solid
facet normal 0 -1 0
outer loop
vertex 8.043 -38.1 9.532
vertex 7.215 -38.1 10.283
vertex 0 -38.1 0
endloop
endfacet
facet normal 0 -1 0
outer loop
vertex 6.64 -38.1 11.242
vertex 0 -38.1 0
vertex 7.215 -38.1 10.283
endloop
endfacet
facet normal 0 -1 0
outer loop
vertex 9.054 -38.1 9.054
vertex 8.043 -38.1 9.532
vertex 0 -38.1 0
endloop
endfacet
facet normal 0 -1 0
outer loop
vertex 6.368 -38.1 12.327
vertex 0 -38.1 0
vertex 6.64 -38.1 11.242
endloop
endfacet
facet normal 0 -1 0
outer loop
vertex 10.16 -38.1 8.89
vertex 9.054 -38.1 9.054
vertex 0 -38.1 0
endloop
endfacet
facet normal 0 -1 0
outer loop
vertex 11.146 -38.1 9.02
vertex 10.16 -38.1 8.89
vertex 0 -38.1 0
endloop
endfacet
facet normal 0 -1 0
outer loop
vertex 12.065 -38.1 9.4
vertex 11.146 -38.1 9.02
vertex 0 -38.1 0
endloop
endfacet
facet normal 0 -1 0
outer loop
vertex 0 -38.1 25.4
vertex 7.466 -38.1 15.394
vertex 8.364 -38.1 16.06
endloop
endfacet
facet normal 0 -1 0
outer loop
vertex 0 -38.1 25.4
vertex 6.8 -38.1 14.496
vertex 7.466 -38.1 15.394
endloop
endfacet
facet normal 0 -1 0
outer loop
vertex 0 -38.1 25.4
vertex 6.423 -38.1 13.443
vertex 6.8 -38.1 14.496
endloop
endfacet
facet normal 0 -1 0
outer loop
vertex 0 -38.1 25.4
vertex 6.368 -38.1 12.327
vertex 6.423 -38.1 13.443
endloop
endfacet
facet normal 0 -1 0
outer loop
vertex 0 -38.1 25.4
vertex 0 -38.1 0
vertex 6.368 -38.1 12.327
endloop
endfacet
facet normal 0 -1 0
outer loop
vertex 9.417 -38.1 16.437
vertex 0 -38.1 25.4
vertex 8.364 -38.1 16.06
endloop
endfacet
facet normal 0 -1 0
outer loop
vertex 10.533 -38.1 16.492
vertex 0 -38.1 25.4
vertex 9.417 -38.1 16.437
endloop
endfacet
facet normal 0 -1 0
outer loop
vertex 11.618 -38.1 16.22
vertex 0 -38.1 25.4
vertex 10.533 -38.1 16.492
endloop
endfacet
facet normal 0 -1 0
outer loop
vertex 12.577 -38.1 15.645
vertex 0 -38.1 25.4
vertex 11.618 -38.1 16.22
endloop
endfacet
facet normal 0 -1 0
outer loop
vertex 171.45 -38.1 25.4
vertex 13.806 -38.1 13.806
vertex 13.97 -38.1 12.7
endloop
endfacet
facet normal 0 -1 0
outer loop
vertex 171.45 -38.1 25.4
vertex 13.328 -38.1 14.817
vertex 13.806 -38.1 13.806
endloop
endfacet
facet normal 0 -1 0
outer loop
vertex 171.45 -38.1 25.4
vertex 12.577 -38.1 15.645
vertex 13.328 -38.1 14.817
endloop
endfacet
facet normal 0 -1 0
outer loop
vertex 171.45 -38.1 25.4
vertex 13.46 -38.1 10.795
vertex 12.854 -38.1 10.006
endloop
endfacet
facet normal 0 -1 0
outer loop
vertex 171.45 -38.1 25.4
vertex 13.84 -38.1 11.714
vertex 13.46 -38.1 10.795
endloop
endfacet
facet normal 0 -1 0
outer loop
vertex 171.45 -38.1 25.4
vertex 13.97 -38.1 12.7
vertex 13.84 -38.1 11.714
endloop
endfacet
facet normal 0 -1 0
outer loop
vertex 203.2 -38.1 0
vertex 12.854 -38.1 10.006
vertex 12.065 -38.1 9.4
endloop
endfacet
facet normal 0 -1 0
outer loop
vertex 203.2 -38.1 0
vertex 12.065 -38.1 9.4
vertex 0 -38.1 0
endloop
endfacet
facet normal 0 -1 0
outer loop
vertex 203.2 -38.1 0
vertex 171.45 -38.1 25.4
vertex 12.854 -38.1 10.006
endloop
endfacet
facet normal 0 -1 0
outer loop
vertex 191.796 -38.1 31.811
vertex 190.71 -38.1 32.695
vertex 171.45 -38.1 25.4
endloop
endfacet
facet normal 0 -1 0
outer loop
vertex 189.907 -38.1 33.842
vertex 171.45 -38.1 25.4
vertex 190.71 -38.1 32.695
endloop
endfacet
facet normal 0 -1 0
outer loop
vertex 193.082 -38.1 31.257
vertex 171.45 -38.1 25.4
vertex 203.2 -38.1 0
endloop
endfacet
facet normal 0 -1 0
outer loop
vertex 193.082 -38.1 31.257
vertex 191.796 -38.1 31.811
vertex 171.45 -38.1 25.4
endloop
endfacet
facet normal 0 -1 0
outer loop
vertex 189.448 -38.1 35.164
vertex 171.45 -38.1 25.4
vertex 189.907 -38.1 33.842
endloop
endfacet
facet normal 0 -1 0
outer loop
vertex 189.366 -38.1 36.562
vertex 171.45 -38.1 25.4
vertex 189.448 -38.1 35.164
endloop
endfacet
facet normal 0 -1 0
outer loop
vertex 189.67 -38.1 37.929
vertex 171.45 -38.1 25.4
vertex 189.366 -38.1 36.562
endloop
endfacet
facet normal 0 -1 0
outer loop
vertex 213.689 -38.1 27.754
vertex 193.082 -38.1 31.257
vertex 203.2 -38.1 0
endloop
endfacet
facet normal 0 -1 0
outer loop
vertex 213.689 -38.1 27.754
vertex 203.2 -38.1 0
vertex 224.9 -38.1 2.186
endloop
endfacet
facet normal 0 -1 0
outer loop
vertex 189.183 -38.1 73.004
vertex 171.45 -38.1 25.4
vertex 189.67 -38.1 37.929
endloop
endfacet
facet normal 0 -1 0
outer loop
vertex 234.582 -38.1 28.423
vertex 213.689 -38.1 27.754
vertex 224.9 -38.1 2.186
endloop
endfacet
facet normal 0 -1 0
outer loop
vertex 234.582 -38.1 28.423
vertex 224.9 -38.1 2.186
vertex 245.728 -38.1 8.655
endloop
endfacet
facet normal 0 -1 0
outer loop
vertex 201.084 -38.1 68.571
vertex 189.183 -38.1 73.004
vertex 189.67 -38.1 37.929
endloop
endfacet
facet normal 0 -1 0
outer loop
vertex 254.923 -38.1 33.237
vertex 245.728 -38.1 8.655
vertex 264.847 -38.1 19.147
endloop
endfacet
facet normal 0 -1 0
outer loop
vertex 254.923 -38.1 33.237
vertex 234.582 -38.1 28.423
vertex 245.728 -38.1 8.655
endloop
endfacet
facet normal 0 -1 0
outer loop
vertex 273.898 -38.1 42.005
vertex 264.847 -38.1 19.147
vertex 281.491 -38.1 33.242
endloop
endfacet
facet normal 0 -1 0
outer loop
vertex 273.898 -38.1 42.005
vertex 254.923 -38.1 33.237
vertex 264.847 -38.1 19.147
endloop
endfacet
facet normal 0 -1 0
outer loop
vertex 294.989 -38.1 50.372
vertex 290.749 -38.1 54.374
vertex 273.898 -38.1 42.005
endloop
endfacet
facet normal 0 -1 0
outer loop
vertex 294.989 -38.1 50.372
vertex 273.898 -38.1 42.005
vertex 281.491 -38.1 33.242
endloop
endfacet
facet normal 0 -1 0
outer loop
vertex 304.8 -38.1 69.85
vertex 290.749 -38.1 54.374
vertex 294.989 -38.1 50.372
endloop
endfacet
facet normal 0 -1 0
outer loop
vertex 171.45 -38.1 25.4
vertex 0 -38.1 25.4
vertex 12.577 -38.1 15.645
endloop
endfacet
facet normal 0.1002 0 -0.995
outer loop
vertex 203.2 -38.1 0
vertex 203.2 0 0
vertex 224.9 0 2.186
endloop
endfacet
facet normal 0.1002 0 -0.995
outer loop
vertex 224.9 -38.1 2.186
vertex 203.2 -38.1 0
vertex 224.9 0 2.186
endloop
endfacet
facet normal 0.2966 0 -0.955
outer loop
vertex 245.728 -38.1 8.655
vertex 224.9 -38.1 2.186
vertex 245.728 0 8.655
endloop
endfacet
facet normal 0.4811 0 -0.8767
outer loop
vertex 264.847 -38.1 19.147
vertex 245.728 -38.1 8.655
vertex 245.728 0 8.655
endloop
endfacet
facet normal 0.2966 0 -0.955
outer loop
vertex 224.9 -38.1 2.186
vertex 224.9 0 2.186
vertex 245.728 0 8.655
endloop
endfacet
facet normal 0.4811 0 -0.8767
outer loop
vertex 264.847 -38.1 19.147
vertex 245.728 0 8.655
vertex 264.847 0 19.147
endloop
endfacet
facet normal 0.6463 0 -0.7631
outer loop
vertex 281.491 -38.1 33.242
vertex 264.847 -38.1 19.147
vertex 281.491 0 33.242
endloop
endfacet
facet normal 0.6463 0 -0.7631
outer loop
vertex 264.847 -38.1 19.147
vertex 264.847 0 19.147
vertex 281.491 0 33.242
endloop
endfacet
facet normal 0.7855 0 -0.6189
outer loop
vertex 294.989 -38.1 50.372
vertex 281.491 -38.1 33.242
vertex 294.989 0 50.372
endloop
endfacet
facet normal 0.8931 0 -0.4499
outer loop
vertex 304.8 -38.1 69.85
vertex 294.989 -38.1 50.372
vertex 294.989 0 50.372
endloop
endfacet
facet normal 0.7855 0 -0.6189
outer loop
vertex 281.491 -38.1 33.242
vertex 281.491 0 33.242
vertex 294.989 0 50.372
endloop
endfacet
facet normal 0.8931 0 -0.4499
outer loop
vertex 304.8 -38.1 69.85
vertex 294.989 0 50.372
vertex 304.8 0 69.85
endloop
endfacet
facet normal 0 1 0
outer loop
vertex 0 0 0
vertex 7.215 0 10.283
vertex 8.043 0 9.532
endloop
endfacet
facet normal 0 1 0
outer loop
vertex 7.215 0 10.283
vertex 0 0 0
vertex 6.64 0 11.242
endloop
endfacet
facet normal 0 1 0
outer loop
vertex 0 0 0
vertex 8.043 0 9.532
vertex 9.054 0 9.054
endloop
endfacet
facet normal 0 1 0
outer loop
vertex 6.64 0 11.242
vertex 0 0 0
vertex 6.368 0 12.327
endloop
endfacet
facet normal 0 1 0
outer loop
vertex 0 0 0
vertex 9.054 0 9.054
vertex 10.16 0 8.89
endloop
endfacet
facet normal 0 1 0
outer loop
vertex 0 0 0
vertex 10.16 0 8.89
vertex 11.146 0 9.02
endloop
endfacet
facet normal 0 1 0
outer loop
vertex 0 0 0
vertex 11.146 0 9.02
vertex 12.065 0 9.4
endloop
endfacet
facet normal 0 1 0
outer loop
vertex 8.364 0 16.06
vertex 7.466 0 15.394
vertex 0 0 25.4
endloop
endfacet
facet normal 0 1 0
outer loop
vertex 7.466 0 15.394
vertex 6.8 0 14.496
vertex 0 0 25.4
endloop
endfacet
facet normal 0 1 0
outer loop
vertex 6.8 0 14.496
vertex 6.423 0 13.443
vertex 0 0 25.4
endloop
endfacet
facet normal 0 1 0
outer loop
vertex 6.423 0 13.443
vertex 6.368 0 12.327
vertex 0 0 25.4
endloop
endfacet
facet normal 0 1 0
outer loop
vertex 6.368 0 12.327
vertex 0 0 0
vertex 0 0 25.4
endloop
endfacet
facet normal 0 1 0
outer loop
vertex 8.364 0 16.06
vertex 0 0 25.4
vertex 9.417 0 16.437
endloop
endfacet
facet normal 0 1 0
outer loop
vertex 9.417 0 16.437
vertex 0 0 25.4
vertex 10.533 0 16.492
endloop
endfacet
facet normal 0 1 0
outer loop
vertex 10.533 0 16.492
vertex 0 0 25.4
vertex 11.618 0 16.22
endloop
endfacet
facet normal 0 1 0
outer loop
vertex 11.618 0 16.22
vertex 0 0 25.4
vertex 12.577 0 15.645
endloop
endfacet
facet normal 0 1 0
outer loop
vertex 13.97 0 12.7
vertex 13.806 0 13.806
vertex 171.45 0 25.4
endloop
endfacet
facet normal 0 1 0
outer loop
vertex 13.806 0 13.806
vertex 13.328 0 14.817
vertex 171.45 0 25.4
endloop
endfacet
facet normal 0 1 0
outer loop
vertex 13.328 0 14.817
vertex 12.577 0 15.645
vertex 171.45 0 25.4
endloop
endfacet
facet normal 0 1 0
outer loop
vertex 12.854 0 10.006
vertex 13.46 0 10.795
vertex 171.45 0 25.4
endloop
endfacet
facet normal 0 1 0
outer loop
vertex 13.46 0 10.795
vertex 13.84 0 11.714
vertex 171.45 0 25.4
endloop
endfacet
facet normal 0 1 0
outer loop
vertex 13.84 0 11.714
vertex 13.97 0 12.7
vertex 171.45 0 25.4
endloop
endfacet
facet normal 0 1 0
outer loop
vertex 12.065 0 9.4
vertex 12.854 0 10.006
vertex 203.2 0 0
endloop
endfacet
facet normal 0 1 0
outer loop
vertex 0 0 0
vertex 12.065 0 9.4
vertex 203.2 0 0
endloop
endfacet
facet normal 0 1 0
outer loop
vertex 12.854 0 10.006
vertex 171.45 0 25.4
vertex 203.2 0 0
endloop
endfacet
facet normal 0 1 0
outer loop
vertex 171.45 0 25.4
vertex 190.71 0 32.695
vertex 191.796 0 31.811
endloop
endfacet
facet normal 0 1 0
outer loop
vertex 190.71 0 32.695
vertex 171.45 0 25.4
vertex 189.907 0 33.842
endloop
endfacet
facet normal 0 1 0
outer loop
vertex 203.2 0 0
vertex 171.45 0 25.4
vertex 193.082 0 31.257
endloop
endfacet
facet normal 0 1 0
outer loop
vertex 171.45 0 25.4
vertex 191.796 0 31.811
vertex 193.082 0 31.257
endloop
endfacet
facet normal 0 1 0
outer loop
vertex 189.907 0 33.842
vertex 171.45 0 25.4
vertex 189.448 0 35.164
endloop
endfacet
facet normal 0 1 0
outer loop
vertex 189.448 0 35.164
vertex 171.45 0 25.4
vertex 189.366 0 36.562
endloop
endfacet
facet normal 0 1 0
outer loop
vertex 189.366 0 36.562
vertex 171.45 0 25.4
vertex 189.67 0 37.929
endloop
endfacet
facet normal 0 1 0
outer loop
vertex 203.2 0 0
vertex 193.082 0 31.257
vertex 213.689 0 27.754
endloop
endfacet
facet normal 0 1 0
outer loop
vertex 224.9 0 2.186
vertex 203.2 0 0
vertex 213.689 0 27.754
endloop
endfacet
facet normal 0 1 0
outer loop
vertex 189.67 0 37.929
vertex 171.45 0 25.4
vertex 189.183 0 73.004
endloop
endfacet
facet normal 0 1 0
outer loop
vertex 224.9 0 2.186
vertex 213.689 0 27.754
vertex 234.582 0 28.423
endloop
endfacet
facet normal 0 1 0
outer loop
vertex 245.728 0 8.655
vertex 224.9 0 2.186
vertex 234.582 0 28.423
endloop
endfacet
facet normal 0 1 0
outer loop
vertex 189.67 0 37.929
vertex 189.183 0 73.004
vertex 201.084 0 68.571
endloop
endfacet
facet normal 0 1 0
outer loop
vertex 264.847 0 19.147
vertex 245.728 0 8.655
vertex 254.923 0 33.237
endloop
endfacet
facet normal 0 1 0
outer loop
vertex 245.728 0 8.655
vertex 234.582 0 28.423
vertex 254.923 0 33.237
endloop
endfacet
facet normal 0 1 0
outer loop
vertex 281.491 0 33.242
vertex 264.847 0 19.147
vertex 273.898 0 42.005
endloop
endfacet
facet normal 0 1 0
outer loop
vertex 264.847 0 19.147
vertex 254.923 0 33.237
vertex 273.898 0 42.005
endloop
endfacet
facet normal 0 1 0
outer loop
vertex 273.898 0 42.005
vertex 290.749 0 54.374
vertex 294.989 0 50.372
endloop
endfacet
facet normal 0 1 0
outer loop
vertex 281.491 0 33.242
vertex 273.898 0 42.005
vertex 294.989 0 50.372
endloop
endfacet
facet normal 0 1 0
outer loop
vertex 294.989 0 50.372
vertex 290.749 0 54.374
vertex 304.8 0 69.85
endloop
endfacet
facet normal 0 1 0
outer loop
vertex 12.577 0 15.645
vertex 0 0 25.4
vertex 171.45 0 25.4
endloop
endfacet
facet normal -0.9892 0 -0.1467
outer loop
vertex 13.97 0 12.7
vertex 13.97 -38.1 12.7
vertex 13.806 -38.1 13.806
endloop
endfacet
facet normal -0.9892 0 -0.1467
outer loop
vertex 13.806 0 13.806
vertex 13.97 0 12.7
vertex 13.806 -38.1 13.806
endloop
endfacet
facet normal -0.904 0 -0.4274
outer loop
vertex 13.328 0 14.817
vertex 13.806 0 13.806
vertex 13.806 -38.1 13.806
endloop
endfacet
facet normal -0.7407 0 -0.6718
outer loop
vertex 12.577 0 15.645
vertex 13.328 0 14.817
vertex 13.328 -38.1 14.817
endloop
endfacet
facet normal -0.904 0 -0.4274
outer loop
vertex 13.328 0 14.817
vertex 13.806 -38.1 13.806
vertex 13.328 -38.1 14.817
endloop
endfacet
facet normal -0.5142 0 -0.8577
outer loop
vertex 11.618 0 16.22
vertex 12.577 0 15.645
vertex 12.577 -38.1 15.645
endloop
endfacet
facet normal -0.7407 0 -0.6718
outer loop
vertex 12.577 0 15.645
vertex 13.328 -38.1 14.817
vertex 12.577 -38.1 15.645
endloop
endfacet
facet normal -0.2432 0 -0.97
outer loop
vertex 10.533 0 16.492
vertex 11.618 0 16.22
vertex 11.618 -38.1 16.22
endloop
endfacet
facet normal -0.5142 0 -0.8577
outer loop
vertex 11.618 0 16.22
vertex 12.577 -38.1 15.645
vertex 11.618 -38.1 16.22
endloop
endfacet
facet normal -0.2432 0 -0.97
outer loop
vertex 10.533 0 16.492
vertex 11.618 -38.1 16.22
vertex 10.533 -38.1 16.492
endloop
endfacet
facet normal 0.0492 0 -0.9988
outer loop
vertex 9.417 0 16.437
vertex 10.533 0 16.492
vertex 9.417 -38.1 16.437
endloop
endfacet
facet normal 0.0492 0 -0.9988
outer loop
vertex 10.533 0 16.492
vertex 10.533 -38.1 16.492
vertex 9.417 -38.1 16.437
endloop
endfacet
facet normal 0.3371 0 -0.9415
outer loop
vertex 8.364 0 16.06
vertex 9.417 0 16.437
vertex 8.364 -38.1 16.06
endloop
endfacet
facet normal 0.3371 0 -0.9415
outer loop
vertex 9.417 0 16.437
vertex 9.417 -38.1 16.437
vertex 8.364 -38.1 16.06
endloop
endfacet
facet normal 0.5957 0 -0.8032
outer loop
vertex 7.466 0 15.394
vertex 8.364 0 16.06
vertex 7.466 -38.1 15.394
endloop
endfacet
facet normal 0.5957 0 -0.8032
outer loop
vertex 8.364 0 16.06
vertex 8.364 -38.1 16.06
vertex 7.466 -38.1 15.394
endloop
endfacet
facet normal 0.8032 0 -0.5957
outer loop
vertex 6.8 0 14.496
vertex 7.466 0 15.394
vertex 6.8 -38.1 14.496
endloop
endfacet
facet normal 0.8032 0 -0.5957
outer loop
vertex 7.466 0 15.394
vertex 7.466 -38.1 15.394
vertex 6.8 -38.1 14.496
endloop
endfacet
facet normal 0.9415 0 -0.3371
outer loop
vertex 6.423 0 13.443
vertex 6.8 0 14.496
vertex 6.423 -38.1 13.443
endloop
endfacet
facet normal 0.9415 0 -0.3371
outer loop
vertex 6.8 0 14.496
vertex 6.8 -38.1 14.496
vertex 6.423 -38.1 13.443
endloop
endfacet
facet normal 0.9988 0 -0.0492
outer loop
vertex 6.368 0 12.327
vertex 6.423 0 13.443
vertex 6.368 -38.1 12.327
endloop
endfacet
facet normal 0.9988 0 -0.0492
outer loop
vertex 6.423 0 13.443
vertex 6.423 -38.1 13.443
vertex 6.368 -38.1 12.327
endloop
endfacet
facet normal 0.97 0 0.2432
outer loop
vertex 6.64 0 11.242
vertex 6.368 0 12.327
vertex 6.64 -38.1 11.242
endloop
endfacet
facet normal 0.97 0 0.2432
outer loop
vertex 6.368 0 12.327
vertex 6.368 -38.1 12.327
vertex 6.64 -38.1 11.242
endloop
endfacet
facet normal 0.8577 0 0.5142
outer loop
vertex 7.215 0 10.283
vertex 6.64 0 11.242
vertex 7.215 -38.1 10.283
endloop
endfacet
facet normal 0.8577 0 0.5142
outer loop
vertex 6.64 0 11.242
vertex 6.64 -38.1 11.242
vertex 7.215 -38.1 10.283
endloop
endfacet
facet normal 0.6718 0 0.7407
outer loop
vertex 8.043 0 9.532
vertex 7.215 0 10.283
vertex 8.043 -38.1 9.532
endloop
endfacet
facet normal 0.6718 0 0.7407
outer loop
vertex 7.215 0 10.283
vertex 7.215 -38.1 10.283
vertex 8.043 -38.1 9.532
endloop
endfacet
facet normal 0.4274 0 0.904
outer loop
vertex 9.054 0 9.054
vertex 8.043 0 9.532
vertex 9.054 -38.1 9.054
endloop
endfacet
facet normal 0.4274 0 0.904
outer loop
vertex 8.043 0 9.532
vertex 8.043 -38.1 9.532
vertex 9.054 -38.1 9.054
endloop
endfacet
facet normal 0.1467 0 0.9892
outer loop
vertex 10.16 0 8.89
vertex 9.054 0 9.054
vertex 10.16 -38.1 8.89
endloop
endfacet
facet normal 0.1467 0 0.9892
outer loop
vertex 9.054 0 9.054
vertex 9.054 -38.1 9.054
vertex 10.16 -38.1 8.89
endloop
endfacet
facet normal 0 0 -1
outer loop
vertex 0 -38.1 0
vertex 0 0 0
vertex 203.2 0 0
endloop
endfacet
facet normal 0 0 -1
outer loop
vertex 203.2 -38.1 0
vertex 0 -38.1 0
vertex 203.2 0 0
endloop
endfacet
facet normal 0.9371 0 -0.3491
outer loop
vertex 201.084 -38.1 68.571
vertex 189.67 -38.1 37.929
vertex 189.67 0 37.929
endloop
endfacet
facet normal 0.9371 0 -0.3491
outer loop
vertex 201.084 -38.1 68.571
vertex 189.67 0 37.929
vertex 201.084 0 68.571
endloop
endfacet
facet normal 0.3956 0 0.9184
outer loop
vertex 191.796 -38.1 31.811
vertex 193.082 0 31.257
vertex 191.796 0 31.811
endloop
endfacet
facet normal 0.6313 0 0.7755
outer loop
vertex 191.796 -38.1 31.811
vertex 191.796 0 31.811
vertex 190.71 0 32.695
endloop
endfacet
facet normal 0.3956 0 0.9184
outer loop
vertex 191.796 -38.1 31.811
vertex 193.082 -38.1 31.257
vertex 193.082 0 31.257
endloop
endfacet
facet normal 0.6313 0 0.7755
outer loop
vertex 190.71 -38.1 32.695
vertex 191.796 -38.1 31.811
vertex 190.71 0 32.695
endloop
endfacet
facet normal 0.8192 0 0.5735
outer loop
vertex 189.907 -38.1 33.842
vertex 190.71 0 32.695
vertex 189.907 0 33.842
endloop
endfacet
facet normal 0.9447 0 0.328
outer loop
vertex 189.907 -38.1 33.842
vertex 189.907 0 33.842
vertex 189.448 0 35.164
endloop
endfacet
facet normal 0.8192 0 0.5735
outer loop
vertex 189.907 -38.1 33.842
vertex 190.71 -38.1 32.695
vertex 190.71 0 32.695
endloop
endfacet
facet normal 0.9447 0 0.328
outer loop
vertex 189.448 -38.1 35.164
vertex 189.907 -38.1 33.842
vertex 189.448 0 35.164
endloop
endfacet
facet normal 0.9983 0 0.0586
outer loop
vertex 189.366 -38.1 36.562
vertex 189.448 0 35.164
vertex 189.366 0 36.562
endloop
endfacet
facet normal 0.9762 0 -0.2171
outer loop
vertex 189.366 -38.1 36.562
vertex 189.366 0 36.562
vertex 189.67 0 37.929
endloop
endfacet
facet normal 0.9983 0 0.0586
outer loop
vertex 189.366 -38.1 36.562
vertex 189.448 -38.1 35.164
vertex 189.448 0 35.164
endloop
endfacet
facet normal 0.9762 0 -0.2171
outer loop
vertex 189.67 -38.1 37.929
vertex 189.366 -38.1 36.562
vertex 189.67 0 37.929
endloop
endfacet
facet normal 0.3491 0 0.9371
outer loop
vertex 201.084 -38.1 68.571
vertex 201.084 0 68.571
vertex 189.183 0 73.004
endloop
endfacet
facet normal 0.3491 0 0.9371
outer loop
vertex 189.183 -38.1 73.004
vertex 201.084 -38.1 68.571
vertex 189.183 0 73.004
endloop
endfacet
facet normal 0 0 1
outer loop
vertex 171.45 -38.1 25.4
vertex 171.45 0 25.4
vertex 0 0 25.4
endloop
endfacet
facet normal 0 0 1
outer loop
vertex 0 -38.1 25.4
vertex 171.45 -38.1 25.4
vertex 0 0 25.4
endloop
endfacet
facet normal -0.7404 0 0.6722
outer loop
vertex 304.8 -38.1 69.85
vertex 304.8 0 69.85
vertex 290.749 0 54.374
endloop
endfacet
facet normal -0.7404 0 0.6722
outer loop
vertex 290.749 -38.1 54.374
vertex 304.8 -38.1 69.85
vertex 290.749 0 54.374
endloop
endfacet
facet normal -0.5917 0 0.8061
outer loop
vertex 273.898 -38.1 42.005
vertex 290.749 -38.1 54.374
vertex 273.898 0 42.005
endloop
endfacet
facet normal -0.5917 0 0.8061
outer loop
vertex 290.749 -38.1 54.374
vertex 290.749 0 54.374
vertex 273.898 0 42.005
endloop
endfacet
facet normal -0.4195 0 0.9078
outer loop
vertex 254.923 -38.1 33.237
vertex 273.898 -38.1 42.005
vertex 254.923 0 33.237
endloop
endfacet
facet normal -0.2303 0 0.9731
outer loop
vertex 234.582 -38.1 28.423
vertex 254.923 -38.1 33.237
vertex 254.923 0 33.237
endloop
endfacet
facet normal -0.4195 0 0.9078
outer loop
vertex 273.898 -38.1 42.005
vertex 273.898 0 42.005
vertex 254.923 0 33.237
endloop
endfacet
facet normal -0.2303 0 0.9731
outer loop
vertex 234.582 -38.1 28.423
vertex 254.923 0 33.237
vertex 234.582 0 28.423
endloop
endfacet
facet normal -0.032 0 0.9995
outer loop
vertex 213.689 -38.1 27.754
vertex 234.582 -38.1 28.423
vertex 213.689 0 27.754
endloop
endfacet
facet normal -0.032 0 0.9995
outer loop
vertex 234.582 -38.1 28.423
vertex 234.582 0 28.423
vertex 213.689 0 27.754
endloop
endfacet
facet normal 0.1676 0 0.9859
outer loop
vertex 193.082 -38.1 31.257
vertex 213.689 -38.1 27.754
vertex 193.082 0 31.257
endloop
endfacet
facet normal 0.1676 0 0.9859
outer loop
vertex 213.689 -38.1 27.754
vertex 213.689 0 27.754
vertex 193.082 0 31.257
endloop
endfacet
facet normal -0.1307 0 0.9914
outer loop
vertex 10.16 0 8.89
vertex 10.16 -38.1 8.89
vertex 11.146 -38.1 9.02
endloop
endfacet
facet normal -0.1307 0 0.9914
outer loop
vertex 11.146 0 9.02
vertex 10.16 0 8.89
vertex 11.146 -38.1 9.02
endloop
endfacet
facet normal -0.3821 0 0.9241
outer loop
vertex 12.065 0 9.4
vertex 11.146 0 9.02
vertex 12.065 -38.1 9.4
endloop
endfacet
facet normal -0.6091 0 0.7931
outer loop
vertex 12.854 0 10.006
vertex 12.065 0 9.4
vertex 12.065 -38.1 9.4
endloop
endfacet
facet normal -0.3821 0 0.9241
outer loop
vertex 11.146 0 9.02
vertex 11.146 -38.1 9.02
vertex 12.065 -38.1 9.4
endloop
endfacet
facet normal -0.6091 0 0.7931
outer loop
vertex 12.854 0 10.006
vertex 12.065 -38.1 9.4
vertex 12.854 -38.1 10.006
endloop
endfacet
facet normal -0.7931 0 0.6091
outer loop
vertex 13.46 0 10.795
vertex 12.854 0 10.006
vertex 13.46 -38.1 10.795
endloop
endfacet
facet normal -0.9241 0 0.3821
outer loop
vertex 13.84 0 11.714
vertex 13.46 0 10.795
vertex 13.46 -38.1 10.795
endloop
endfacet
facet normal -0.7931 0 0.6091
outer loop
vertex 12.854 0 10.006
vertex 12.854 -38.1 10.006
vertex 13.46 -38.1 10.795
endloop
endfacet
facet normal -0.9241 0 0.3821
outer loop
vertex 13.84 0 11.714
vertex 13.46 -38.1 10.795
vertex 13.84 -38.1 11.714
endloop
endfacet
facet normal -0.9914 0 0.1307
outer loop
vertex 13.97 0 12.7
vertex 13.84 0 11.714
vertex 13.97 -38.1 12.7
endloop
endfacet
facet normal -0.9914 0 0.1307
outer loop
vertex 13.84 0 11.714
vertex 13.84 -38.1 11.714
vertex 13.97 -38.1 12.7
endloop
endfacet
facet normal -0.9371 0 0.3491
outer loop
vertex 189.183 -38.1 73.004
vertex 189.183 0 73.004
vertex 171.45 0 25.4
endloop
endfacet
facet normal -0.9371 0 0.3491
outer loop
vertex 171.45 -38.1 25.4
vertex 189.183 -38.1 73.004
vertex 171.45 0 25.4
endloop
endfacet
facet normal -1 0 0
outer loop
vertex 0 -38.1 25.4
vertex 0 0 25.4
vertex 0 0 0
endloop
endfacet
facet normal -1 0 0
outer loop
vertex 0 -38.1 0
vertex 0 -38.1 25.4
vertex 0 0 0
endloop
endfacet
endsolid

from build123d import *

# Parameters (mm, degrees)
F1_DEPTH = 38.1
F3_DEPTH = 50.8
F4_R     = 5.08


with BuildPart() as f1:
    # F0 (on Front) → F1 (new body)
    with BuildSketch(Plane.XZ):
        with BuildLine():
            Line((0, 25.4), (0, 0))
            Line((0, 0), (203.2, 0))
            ThreePointArc((203.2, 0), (264.847349, 19.147038), (304.8, 69.85))
            ThreePointArc((304.8, 69.85), (252.294174, 32.367952), (187.784361, 32.86784))
            Line((187.784361, 32.86784), (201.084143, 68.571143))
            Line((201.084143, 68.571143), (189.183042, 73.004403))
            Line((189.183042, 73.004403), (171.45, 25.4))
            Line((171.45, 25.4), (0, 25.4))
        make_face()
    extrude(amount=F1_DEPTH)

    # F2 (on face) → F3 (cut)
    with BuildSketch(Plane.XZ.offset(38.1)):
        with BuildLine():
            ThreePointArc((13.97, 12.7), (7.465923, 15.394077), (10.16, 8.89))
            ThreePointArc((10.16, 8.89), (12.854077, 10.005923), (13.97, 12.7))
        make_face()
    extrude(amount=-F3_DEPTH, mode=Mode.SUBTRACT)

    # F4
    f4_edges = [f1.edges().sort_by_distance(p)[0] for p in [
        (187.784361, -19.05, 32.86784),
    ]]
    fillet(f4_edges, radius=F4_R)


solid = f1.part
